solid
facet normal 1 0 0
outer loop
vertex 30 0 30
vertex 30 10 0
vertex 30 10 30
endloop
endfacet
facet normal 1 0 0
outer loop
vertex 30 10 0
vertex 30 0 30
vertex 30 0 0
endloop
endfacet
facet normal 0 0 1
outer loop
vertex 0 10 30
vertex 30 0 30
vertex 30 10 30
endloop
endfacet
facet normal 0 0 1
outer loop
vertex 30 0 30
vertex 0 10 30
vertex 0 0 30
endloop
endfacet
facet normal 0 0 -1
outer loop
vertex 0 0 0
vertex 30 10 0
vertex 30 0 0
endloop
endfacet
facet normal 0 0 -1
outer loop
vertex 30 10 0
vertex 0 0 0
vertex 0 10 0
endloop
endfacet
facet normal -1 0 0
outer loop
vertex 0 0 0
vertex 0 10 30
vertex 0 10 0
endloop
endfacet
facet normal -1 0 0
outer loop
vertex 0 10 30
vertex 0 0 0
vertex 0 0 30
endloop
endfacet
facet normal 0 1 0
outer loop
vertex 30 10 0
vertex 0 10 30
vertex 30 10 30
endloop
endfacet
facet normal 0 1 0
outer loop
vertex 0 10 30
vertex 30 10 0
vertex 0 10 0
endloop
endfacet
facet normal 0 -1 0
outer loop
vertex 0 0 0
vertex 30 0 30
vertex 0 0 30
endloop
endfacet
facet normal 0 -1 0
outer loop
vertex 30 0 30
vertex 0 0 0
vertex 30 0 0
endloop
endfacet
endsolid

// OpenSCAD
Door_stop_L = 30;
Door_stop_H = 30;
Door_stop_W = 10;

//difference(){
// cylinder(Door_stop_L,Door_stop_W,Door_stop_H,$fn=3);
//    
//}
difference(){
cube([Door_stop_L,Door_stop_W,Door_stop_H]);
translate([Door_stop_L,Door_stop_W,Door_stop_H])
cube([Door_stop_L,Door_stop_W,Door_stop_H]);;
}
